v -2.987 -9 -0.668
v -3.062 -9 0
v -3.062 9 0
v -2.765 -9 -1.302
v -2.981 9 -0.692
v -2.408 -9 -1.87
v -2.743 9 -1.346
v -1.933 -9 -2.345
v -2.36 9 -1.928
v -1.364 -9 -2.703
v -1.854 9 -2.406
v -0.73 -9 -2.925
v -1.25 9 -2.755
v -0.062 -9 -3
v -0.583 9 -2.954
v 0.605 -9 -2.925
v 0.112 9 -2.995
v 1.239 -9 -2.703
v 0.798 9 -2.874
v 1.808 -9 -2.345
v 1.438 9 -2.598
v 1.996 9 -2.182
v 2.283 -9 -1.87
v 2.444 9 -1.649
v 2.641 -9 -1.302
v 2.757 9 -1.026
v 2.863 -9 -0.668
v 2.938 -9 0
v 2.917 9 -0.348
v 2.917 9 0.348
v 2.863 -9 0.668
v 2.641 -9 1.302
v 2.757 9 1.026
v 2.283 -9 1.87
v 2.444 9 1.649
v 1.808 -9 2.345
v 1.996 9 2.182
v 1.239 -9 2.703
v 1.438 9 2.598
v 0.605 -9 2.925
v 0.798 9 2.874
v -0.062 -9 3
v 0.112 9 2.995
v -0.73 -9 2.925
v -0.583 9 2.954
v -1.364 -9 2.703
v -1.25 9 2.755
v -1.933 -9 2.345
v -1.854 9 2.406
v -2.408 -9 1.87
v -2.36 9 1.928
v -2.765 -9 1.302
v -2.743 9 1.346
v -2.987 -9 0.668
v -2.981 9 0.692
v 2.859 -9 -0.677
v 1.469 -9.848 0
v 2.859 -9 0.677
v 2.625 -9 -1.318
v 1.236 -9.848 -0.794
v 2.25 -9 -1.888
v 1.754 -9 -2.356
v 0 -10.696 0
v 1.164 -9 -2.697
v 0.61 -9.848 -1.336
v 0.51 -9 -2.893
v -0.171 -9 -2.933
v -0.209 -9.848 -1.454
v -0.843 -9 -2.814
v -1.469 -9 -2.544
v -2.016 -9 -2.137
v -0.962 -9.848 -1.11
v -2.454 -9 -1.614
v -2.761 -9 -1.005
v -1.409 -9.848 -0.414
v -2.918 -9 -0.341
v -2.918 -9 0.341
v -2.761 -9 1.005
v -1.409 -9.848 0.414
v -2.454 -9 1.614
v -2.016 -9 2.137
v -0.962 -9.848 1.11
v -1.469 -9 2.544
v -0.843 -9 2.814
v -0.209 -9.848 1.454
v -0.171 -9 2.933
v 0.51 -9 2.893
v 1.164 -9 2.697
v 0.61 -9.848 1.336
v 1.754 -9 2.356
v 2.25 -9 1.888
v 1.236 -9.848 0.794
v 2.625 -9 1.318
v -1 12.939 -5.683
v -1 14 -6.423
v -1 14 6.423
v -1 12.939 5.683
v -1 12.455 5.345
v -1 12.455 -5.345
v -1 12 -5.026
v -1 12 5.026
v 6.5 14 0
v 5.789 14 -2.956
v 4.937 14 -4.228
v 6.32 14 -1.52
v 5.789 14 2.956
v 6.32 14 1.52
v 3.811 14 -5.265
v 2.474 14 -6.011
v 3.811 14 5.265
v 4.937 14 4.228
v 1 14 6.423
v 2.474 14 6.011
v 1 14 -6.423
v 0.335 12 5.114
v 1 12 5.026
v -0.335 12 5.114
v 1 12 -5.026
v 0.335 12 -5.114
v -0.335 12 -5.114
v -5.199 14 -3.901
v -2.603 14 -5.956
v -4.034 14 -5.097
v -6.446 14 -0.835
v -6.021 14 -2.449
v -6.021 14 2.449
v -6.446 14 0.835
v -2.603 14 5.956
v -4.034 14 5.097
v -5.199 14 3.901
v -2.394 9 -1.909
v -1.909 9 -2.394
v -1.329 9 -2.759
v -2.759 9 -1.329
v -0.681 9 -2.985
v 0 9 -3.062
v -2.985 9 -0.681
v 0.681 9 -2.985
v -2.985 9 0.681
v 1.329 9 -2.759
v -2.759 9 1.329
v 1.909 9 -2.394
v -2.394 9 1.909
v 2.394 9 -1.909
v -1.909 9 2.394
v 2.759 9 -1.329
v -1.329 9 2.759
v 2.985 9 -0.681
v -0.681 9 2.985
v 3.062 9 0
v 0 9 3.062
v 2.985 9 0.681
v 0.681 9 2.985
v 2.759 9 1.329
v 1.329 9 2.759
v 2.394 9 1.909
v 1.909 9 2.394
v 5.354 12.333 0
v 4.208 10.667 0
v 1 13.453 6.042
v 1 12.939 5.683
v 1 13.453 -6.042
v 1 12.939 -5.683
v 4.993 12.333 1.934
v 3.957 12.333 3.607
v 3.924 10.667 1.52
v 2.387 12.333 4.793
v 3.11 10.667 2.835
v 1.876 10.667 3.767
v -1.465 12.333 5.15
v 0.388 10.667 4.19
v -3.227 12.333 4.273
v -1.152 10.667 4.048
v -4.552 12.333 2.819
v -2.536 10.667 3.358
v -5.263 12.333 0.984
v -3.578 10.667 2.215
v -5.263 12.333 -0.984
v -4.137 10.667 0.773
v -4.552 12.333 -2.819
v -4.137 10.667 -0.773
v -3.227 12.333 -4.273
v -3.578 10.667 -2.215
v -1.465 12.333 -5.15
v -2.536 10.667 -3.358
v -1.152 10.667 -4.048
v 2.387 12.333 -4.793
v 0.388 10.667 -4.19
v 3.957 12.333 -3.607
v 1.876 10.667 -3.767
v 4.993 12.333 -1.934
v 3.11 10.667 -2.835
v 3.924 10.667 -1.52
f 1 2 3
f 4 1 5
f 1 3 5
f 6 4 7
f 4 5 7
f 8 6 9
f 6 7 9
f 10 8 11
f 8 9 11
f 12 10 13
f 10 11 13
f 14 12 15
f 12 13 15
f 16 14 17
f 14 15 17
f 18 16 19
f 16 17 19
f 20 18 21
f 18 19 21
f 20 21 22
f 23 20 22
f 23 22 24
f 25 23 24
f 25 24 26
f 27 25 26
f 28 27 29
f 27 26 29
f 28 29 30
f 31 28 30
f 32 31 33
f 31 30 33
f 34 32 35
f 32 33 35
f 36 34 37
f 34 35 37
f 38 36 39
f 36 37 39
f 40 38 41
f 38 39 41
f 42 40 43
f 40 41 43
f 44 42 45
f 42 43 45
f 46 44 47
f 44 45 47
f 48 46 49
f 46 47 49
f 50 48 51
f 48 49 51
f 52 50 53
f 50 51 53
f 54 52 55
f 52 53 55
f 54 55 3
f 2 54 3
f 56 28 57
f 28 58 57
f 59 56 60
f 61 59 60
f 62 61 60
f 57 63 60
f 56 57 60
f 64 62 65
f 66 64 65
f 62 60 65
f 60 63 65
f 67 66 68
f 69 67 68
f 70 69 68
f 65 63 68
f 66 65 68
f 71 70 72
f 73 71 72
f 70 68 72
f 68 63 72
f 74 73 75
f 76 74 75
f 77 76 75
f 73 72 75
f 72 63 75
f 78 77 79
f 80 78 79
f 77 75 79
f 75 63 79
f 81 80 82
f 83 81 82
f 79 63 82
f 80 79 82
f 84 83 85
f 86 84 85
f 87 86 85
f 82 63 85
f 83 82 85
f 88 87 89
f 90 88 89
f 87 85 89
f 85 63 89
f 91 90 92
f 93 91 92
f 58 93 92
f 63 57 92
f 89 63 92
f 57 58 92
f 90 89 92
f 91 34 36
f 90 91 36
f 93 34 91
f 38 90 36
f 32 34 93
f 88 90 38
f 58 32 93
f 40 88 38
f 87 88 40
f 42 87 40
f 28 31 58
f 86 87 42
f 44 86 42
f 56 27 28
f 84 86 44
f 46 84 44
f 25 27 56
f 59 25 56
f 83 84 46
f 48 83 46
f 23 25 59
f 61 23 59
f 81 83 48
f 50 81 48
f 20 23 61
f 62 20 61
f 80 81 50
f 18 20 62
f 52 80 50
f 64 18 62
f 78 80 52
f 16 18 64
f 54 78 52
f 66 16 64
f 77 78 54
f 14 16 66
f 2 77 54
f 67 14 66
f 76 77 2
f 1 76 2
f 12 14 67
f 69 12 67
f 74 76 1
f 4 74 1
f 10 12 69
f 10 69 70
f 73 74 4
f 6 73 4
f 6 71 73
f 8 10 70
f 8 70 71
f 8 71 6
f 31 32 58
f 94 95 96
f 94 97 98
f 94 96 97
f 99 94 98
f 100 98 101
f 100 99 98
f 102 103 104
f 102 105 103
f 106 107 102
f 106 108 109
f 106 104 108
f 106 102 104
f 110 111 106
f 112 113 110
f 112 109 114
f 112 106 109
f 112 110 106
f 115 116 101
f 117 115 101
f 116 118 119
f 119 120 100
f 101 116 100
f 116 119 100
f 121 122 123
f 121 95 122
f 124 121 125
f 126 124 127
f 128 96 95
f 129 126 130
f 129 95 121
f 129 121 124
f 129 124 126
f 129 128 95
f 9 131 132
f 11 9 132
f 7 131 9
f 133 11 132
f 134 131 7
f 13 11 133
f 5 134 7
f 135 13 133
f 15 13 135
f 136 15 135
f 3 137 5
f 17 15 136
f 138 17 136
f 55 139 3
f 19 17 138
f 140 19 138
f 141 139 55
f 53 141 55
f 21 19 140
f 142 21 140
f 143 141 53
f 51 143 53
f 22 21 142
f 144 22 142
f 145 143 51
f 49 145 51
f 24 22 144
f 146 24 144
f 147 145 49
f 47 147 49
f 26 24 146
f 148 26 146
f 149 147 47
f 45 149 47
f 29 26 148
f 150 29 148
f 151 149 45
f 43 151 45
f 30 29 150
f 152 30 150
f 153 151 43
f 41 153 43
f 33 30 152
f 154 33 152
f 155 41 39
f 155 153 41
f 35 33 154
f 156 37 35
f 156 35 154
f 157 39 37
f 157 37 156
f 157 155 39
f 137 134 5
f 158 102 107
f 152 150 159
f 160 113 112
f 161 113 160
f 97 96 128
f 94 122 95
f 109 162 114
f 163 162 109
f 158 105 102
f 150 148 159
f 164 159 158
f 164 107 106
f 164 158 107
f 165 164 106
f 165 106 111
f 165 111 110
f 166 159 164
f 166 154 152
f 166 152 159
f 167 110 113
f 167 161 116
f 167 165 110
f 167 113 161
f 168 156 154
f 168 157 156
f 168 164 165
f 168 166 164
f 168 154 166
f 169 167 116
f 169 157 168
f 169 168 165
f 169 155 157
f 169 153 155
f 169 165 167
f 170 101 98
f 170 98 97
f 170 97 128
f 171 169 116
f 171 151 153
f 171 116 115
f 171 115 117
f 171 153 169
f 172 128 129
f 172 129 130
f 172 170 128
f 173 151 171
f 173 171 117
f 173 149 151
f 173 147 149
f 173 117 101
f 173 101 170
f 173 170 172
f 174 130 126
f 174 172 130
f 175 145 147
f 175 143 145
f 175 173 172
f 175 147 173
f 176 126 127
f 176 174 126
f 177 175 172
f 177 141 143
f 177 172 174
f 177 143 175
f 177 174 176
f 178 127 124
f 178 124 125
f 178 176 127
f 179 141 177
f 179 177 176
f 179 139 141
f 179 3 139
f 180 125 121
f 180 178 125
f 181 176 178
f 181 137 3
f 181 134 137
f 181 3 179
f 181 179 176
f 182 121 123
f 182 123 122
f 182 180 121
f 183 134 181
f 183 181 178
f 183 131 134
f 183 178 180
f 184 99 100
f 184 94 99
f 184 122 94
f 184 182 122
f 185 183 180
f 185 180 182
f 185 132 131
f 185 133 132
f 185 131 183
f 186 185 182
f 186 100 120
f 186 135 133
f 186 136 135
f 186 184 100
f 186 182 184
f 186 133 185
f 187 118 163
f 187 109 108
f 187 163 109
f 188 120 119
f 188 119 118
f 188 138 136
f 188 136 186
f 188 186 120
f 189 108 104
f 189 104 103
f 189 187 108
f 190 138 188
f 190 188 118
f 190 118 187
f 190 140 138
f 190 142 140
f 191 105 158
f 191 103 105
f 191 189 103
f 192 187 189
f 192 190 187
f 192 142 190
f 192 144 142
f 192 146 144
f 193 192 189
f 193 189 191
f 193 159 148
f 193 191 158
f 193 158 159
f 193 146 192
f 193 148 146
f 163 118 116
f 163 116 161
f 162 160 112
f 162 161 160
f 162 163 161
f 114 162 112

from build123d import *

# Parameters (mm, degrees)
SKETCH1_W               = 3
SKETCH1_H               = 18
CUT_EXTRUDE1_DEPTH      = 7.5
CUT_EXTRUDE1_DEPTH_BACK = 7.5


with BuildPart() as part:
    # Sketch1 → Revolve2 (revolve)
    with BuildSketch(Plane.XY):
        with Locations((-1.562240664, 0)):
            Rectangle(SKETCH1_W, SKETCH1_H)
    revolve(axis=Axis((-0.062240664, 9, 0), (0, -1, 0)))

    # Sketch3 → Revolve3 (revolve)
    with BuildSketch(Plane.XY):
        Polygon((3.062240664, 9), (0, 9), (0, 14), (6.5, 14), align=None)
    revolve(axis=Axis((0, 14, 0), (0, -1, 0)))

    # Sketch4 → Cut-Extrude1 (cut, two sides)
    with BuildSketch(Plane.XY) as cut_extrude1_sk:
        Polygon((1, 72.383881614), (1, 14), (1, 12), (-1, 12), (-1, 14), (-1, 72.383881614), (-1, 189.151644841), (1, 189.151644841), align=None)
    extrude(amount=CUT_EXTRUDE1_DEPTH, mode=Mode.SUBTRACT)
    extrude(cut_extrude1_sk.sketch, amount=-CUT_EXTRUDE1_DEPTH_BACK, mode=Mode.SUBTRACT)

    # Sketch5 → Revolve4 (revolve)
    with BuildSketch(Plane.XY):
        Polygon((2.937759336, -9), (0, -10.696116144), (0, -9), align=None)
    revolve(axis=Axis((0, -10.696116144, 0), (0, 1, 0)))


solid = part.part
